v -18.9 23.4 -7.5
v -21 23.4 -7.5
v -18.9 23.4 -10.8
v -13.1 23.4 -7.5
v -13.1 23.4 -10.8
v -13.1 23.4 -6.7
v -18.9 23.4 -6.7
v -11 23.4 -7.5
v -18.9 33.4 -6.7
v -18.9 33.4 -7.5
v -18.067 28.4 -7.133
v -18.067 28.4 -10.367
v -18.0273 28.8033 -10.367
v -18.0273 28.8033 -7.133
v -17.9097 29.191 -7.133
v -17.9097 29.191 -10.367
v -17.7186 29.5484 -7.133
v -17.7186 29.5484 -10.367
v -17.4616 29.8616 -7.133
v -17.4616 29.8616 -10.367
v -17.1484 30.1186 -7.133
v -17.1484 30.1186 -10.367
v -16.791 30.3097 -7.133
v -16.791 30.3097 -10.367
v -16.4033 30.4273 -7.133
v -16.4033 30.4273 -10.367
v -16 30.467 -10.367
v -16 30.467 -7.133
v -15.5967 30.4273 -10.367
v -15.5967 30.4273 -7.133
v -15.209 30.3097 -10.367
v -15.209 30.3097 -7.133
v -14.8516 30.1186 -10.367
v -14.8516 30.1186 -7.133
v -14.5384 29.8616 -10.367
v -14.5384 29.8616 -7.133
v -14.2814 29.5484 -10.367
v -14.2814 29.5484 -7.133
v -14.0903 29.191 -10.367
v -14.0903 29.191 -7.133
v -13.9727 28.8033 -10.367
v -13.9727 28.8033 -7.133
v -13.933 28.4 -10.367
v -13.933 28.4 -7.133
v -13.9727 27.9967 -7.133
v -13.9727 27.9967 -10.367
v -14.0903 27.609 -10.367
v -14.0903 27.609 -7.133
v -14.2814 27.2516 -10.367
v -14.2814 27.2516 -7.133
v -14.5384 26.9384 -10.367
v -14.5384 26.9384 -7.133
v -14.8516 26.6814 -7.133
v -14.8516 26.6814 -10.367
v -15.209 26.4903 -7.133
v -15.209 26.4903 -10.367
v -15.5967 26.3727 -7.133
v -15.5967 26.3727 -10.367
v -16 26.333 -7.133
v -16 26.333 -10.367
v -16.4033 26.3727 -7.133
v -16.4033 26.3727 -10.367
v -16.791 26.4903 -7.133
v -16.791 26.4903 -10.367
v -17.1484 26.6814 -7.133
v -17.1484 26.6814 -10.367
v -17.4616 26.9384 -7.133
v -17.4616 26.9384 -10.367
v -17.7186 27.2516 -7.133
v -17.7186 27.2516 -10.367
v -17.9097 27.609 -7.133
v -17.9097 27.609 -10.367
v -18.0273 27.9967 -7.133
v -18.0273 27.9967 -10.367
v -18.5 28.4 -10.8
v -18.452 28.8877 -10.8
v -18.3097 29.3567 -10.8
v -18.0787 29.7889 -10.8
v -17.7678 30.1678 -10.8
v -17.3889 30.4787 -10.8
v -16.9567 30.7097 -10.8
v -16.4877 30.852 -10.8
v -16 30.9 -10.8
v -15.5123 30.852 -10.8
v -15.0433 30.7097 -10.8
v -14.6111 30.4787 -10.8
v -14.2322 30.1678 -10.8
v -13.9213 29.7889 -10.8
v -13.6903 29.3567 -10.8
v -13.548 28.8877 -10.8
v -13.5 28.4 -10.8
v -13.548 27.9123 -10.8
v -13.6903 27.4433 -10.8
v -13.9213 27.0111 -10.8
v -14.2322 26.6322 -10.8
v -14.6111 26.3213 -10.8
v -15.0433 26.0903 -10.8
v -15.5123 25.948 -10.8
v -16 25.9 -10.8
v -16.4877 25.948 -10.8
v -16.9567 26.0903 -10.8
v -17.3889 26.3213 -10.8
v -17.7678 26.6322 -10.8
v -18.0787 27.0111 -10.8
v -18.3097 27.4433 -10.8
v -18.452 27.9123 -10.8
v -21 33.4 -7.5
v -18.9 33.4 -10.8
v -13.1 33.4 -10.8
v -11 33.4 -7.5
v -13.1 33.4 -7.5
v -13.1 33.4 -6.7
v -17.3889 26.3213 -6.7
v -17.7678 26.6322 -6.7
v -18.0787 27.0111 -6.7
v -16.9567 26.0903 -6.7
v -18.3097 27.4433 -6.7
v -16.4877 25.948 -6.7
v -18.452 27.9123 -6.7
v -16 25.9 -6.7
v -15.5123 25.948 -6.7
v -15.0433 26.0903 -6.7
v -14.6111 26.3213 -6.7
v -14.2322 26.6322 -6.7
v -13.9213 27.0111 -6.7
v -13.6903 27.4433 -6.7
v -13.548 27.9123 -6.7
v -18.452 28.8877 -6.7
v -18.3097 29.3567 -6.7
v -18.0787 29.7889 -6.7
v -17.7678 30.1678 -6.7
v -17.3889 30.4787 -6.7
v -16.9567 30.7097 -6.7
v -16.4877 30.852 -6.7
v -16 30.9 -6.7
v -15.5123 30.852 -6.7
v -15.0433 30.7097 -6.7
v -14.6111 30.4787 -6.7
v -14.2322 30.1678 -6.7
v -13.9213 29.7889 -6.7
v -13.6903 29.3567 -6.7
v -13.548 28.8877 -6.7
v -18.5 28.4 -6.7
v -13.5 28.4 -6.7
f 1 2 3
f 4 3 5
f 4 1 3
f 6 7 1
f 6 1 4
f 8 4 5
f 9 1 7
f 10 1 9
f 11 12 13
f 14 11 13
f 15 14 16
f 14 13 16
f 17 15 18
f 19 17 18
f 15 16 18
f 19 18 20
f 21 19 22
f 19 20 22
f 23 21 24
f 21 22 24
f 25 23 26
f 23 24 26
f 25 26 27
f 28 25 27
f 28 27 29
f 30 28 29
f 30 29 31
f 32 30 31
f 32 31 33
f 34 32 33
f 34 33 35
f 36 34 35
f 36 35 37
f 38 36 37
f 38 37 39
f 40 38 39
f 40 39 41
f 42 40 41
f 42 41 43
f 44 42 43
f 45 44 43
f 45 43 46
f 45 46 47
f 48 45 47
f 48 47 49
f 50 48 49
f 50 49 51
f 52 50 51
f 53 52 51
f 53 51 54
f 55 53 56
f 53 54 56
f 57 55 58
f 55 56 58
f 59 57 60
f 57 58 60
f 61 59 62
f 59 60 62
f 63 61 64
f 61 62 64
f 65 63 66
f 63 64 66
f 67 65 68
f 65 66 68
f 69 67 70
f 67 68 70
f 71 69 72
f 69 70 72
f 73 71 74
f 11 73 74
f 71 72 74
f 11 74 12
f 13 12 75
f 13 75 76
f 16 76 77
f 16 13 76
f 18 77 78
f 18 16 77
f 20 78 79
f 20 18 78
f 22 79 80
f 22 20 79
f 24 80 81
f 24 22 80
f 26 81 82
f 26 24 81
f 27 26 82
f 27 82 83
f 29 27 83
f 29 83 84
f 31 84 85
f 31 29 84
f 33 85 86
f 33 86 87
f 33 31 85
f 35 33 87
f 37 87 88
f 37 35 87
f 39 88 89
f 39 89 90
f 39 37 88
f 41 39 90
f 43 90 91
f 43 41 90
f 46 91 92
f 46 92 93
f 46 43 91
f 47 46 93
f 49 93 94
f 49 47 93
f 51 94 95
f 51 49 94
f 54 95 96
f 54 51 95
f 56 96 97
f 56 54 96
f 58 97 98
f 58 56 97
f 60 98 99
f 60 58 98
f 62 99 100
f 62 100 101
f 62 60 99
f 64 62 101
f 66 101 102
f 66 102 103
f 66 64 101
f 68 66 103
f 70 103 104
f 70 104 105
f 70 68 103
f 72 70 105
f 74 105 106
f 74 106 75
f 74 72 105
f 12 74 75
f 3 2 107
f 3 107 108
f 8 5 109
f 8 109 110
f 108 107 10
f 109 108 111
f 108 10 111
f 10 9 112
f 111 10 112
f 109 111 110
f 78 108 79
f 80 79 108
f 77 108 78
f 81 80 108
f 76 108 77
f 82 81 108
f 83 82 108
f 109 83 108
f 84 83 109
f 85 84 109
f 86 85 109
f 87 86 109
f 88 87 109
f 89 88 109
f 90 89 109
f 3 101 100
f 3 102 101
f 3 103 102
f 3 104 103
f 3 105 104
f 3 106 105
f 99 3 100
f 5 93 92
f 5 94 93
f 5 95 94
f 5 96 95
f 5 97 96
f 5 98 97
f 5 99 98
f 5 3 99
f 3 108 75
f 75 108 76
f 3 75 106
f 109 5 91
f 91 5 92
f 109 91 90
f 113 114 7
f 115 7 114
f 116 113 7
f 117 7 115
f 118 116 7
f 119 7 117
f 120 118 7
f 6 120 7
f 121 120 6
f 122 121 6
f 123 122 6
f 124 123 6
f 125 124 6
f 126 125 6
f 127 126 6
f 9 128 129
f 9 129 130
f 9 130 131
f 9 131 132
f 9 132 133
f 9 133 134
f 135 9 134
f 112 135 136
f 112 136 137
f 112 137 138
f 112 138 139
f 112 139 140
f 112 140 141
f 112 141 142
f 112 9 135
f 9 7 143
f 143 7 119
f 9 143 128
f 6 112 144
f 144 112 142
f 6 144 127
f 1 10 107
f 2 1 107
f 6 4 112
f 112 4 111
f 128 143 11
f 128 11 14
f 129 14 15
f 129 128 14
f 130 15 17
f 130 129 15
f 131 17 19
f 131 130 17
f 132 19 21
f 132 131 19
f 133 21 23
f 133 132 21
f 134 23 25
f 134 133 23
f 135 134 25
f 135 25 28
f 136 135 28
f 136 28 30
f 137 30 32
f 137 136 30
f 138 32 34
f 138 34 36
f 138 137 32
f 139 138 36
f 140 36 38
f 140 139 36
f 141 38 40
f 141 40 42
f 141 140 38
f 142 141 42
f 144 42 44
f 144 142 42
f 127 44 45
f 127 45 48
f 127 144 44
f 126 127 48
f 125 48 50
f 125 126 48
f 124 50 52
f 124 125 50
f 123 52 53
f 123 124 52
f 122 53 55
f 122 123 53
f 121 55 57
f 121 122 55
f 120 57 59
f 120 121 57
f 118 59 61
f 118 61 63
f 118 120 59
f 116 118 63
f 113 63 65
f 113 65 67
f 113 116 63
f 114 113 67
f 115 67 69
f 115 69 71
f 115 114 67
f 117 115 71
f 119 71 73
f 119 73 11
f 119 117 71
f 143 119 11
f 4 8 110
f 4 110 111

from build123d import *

# Parameters (mm, degrees)
EXTRUDE1_DEPTH = 10
SKETCH2_W      = 5.8
SKETCH2_H      = 10
EXTRUDE2_DEPTH = 0.8
HOLEWZD1_D     = 4.134
HOLEWZD1_DEPTH = 4.1
CHAMFER1_SIZE  = 0.433


with BuildPart() as part:
    # Sketch1 → Extrude1 (new body)
    with BuildSketch(Plane.XZ.offset(-23.4)):
        Polygon((-13.1, -10.8), (-11, -7.5), (-21, -7.5), (-18.9, -10.8), align=None)
    extrude(amount=-EXTRUDE1_DEPTH)

    # Sketch2 → Extrude2 (add)
    with BuildSketch(Plane.XY.offset(-7.5)):
        with Locations((-16, 28.4)):
            Rectangle(SKETCH2_W, SKETCH2_H)
    extrude(amount=EXTRUDE2_DEPTH)

    # HoleWzd1
    with Locations(Plane.XY.offset(-6.7)):
        with Locations((-16, 28.4)):
            Hole(HOLEWZD1_D / 2, depth=HOLEWZD1_DEPTH)

    # Chamfer1
    chamfer1_edges = [part.edges().sort_by_distance(p)[0] for p in [
        (-13.933, 28.4, -6.7),
        (-13.933, 28.4, -10.8),
    ]]
    chamfer(chamfer1_edges, length=CHAMFER1_SIZE)


solid = part.part
